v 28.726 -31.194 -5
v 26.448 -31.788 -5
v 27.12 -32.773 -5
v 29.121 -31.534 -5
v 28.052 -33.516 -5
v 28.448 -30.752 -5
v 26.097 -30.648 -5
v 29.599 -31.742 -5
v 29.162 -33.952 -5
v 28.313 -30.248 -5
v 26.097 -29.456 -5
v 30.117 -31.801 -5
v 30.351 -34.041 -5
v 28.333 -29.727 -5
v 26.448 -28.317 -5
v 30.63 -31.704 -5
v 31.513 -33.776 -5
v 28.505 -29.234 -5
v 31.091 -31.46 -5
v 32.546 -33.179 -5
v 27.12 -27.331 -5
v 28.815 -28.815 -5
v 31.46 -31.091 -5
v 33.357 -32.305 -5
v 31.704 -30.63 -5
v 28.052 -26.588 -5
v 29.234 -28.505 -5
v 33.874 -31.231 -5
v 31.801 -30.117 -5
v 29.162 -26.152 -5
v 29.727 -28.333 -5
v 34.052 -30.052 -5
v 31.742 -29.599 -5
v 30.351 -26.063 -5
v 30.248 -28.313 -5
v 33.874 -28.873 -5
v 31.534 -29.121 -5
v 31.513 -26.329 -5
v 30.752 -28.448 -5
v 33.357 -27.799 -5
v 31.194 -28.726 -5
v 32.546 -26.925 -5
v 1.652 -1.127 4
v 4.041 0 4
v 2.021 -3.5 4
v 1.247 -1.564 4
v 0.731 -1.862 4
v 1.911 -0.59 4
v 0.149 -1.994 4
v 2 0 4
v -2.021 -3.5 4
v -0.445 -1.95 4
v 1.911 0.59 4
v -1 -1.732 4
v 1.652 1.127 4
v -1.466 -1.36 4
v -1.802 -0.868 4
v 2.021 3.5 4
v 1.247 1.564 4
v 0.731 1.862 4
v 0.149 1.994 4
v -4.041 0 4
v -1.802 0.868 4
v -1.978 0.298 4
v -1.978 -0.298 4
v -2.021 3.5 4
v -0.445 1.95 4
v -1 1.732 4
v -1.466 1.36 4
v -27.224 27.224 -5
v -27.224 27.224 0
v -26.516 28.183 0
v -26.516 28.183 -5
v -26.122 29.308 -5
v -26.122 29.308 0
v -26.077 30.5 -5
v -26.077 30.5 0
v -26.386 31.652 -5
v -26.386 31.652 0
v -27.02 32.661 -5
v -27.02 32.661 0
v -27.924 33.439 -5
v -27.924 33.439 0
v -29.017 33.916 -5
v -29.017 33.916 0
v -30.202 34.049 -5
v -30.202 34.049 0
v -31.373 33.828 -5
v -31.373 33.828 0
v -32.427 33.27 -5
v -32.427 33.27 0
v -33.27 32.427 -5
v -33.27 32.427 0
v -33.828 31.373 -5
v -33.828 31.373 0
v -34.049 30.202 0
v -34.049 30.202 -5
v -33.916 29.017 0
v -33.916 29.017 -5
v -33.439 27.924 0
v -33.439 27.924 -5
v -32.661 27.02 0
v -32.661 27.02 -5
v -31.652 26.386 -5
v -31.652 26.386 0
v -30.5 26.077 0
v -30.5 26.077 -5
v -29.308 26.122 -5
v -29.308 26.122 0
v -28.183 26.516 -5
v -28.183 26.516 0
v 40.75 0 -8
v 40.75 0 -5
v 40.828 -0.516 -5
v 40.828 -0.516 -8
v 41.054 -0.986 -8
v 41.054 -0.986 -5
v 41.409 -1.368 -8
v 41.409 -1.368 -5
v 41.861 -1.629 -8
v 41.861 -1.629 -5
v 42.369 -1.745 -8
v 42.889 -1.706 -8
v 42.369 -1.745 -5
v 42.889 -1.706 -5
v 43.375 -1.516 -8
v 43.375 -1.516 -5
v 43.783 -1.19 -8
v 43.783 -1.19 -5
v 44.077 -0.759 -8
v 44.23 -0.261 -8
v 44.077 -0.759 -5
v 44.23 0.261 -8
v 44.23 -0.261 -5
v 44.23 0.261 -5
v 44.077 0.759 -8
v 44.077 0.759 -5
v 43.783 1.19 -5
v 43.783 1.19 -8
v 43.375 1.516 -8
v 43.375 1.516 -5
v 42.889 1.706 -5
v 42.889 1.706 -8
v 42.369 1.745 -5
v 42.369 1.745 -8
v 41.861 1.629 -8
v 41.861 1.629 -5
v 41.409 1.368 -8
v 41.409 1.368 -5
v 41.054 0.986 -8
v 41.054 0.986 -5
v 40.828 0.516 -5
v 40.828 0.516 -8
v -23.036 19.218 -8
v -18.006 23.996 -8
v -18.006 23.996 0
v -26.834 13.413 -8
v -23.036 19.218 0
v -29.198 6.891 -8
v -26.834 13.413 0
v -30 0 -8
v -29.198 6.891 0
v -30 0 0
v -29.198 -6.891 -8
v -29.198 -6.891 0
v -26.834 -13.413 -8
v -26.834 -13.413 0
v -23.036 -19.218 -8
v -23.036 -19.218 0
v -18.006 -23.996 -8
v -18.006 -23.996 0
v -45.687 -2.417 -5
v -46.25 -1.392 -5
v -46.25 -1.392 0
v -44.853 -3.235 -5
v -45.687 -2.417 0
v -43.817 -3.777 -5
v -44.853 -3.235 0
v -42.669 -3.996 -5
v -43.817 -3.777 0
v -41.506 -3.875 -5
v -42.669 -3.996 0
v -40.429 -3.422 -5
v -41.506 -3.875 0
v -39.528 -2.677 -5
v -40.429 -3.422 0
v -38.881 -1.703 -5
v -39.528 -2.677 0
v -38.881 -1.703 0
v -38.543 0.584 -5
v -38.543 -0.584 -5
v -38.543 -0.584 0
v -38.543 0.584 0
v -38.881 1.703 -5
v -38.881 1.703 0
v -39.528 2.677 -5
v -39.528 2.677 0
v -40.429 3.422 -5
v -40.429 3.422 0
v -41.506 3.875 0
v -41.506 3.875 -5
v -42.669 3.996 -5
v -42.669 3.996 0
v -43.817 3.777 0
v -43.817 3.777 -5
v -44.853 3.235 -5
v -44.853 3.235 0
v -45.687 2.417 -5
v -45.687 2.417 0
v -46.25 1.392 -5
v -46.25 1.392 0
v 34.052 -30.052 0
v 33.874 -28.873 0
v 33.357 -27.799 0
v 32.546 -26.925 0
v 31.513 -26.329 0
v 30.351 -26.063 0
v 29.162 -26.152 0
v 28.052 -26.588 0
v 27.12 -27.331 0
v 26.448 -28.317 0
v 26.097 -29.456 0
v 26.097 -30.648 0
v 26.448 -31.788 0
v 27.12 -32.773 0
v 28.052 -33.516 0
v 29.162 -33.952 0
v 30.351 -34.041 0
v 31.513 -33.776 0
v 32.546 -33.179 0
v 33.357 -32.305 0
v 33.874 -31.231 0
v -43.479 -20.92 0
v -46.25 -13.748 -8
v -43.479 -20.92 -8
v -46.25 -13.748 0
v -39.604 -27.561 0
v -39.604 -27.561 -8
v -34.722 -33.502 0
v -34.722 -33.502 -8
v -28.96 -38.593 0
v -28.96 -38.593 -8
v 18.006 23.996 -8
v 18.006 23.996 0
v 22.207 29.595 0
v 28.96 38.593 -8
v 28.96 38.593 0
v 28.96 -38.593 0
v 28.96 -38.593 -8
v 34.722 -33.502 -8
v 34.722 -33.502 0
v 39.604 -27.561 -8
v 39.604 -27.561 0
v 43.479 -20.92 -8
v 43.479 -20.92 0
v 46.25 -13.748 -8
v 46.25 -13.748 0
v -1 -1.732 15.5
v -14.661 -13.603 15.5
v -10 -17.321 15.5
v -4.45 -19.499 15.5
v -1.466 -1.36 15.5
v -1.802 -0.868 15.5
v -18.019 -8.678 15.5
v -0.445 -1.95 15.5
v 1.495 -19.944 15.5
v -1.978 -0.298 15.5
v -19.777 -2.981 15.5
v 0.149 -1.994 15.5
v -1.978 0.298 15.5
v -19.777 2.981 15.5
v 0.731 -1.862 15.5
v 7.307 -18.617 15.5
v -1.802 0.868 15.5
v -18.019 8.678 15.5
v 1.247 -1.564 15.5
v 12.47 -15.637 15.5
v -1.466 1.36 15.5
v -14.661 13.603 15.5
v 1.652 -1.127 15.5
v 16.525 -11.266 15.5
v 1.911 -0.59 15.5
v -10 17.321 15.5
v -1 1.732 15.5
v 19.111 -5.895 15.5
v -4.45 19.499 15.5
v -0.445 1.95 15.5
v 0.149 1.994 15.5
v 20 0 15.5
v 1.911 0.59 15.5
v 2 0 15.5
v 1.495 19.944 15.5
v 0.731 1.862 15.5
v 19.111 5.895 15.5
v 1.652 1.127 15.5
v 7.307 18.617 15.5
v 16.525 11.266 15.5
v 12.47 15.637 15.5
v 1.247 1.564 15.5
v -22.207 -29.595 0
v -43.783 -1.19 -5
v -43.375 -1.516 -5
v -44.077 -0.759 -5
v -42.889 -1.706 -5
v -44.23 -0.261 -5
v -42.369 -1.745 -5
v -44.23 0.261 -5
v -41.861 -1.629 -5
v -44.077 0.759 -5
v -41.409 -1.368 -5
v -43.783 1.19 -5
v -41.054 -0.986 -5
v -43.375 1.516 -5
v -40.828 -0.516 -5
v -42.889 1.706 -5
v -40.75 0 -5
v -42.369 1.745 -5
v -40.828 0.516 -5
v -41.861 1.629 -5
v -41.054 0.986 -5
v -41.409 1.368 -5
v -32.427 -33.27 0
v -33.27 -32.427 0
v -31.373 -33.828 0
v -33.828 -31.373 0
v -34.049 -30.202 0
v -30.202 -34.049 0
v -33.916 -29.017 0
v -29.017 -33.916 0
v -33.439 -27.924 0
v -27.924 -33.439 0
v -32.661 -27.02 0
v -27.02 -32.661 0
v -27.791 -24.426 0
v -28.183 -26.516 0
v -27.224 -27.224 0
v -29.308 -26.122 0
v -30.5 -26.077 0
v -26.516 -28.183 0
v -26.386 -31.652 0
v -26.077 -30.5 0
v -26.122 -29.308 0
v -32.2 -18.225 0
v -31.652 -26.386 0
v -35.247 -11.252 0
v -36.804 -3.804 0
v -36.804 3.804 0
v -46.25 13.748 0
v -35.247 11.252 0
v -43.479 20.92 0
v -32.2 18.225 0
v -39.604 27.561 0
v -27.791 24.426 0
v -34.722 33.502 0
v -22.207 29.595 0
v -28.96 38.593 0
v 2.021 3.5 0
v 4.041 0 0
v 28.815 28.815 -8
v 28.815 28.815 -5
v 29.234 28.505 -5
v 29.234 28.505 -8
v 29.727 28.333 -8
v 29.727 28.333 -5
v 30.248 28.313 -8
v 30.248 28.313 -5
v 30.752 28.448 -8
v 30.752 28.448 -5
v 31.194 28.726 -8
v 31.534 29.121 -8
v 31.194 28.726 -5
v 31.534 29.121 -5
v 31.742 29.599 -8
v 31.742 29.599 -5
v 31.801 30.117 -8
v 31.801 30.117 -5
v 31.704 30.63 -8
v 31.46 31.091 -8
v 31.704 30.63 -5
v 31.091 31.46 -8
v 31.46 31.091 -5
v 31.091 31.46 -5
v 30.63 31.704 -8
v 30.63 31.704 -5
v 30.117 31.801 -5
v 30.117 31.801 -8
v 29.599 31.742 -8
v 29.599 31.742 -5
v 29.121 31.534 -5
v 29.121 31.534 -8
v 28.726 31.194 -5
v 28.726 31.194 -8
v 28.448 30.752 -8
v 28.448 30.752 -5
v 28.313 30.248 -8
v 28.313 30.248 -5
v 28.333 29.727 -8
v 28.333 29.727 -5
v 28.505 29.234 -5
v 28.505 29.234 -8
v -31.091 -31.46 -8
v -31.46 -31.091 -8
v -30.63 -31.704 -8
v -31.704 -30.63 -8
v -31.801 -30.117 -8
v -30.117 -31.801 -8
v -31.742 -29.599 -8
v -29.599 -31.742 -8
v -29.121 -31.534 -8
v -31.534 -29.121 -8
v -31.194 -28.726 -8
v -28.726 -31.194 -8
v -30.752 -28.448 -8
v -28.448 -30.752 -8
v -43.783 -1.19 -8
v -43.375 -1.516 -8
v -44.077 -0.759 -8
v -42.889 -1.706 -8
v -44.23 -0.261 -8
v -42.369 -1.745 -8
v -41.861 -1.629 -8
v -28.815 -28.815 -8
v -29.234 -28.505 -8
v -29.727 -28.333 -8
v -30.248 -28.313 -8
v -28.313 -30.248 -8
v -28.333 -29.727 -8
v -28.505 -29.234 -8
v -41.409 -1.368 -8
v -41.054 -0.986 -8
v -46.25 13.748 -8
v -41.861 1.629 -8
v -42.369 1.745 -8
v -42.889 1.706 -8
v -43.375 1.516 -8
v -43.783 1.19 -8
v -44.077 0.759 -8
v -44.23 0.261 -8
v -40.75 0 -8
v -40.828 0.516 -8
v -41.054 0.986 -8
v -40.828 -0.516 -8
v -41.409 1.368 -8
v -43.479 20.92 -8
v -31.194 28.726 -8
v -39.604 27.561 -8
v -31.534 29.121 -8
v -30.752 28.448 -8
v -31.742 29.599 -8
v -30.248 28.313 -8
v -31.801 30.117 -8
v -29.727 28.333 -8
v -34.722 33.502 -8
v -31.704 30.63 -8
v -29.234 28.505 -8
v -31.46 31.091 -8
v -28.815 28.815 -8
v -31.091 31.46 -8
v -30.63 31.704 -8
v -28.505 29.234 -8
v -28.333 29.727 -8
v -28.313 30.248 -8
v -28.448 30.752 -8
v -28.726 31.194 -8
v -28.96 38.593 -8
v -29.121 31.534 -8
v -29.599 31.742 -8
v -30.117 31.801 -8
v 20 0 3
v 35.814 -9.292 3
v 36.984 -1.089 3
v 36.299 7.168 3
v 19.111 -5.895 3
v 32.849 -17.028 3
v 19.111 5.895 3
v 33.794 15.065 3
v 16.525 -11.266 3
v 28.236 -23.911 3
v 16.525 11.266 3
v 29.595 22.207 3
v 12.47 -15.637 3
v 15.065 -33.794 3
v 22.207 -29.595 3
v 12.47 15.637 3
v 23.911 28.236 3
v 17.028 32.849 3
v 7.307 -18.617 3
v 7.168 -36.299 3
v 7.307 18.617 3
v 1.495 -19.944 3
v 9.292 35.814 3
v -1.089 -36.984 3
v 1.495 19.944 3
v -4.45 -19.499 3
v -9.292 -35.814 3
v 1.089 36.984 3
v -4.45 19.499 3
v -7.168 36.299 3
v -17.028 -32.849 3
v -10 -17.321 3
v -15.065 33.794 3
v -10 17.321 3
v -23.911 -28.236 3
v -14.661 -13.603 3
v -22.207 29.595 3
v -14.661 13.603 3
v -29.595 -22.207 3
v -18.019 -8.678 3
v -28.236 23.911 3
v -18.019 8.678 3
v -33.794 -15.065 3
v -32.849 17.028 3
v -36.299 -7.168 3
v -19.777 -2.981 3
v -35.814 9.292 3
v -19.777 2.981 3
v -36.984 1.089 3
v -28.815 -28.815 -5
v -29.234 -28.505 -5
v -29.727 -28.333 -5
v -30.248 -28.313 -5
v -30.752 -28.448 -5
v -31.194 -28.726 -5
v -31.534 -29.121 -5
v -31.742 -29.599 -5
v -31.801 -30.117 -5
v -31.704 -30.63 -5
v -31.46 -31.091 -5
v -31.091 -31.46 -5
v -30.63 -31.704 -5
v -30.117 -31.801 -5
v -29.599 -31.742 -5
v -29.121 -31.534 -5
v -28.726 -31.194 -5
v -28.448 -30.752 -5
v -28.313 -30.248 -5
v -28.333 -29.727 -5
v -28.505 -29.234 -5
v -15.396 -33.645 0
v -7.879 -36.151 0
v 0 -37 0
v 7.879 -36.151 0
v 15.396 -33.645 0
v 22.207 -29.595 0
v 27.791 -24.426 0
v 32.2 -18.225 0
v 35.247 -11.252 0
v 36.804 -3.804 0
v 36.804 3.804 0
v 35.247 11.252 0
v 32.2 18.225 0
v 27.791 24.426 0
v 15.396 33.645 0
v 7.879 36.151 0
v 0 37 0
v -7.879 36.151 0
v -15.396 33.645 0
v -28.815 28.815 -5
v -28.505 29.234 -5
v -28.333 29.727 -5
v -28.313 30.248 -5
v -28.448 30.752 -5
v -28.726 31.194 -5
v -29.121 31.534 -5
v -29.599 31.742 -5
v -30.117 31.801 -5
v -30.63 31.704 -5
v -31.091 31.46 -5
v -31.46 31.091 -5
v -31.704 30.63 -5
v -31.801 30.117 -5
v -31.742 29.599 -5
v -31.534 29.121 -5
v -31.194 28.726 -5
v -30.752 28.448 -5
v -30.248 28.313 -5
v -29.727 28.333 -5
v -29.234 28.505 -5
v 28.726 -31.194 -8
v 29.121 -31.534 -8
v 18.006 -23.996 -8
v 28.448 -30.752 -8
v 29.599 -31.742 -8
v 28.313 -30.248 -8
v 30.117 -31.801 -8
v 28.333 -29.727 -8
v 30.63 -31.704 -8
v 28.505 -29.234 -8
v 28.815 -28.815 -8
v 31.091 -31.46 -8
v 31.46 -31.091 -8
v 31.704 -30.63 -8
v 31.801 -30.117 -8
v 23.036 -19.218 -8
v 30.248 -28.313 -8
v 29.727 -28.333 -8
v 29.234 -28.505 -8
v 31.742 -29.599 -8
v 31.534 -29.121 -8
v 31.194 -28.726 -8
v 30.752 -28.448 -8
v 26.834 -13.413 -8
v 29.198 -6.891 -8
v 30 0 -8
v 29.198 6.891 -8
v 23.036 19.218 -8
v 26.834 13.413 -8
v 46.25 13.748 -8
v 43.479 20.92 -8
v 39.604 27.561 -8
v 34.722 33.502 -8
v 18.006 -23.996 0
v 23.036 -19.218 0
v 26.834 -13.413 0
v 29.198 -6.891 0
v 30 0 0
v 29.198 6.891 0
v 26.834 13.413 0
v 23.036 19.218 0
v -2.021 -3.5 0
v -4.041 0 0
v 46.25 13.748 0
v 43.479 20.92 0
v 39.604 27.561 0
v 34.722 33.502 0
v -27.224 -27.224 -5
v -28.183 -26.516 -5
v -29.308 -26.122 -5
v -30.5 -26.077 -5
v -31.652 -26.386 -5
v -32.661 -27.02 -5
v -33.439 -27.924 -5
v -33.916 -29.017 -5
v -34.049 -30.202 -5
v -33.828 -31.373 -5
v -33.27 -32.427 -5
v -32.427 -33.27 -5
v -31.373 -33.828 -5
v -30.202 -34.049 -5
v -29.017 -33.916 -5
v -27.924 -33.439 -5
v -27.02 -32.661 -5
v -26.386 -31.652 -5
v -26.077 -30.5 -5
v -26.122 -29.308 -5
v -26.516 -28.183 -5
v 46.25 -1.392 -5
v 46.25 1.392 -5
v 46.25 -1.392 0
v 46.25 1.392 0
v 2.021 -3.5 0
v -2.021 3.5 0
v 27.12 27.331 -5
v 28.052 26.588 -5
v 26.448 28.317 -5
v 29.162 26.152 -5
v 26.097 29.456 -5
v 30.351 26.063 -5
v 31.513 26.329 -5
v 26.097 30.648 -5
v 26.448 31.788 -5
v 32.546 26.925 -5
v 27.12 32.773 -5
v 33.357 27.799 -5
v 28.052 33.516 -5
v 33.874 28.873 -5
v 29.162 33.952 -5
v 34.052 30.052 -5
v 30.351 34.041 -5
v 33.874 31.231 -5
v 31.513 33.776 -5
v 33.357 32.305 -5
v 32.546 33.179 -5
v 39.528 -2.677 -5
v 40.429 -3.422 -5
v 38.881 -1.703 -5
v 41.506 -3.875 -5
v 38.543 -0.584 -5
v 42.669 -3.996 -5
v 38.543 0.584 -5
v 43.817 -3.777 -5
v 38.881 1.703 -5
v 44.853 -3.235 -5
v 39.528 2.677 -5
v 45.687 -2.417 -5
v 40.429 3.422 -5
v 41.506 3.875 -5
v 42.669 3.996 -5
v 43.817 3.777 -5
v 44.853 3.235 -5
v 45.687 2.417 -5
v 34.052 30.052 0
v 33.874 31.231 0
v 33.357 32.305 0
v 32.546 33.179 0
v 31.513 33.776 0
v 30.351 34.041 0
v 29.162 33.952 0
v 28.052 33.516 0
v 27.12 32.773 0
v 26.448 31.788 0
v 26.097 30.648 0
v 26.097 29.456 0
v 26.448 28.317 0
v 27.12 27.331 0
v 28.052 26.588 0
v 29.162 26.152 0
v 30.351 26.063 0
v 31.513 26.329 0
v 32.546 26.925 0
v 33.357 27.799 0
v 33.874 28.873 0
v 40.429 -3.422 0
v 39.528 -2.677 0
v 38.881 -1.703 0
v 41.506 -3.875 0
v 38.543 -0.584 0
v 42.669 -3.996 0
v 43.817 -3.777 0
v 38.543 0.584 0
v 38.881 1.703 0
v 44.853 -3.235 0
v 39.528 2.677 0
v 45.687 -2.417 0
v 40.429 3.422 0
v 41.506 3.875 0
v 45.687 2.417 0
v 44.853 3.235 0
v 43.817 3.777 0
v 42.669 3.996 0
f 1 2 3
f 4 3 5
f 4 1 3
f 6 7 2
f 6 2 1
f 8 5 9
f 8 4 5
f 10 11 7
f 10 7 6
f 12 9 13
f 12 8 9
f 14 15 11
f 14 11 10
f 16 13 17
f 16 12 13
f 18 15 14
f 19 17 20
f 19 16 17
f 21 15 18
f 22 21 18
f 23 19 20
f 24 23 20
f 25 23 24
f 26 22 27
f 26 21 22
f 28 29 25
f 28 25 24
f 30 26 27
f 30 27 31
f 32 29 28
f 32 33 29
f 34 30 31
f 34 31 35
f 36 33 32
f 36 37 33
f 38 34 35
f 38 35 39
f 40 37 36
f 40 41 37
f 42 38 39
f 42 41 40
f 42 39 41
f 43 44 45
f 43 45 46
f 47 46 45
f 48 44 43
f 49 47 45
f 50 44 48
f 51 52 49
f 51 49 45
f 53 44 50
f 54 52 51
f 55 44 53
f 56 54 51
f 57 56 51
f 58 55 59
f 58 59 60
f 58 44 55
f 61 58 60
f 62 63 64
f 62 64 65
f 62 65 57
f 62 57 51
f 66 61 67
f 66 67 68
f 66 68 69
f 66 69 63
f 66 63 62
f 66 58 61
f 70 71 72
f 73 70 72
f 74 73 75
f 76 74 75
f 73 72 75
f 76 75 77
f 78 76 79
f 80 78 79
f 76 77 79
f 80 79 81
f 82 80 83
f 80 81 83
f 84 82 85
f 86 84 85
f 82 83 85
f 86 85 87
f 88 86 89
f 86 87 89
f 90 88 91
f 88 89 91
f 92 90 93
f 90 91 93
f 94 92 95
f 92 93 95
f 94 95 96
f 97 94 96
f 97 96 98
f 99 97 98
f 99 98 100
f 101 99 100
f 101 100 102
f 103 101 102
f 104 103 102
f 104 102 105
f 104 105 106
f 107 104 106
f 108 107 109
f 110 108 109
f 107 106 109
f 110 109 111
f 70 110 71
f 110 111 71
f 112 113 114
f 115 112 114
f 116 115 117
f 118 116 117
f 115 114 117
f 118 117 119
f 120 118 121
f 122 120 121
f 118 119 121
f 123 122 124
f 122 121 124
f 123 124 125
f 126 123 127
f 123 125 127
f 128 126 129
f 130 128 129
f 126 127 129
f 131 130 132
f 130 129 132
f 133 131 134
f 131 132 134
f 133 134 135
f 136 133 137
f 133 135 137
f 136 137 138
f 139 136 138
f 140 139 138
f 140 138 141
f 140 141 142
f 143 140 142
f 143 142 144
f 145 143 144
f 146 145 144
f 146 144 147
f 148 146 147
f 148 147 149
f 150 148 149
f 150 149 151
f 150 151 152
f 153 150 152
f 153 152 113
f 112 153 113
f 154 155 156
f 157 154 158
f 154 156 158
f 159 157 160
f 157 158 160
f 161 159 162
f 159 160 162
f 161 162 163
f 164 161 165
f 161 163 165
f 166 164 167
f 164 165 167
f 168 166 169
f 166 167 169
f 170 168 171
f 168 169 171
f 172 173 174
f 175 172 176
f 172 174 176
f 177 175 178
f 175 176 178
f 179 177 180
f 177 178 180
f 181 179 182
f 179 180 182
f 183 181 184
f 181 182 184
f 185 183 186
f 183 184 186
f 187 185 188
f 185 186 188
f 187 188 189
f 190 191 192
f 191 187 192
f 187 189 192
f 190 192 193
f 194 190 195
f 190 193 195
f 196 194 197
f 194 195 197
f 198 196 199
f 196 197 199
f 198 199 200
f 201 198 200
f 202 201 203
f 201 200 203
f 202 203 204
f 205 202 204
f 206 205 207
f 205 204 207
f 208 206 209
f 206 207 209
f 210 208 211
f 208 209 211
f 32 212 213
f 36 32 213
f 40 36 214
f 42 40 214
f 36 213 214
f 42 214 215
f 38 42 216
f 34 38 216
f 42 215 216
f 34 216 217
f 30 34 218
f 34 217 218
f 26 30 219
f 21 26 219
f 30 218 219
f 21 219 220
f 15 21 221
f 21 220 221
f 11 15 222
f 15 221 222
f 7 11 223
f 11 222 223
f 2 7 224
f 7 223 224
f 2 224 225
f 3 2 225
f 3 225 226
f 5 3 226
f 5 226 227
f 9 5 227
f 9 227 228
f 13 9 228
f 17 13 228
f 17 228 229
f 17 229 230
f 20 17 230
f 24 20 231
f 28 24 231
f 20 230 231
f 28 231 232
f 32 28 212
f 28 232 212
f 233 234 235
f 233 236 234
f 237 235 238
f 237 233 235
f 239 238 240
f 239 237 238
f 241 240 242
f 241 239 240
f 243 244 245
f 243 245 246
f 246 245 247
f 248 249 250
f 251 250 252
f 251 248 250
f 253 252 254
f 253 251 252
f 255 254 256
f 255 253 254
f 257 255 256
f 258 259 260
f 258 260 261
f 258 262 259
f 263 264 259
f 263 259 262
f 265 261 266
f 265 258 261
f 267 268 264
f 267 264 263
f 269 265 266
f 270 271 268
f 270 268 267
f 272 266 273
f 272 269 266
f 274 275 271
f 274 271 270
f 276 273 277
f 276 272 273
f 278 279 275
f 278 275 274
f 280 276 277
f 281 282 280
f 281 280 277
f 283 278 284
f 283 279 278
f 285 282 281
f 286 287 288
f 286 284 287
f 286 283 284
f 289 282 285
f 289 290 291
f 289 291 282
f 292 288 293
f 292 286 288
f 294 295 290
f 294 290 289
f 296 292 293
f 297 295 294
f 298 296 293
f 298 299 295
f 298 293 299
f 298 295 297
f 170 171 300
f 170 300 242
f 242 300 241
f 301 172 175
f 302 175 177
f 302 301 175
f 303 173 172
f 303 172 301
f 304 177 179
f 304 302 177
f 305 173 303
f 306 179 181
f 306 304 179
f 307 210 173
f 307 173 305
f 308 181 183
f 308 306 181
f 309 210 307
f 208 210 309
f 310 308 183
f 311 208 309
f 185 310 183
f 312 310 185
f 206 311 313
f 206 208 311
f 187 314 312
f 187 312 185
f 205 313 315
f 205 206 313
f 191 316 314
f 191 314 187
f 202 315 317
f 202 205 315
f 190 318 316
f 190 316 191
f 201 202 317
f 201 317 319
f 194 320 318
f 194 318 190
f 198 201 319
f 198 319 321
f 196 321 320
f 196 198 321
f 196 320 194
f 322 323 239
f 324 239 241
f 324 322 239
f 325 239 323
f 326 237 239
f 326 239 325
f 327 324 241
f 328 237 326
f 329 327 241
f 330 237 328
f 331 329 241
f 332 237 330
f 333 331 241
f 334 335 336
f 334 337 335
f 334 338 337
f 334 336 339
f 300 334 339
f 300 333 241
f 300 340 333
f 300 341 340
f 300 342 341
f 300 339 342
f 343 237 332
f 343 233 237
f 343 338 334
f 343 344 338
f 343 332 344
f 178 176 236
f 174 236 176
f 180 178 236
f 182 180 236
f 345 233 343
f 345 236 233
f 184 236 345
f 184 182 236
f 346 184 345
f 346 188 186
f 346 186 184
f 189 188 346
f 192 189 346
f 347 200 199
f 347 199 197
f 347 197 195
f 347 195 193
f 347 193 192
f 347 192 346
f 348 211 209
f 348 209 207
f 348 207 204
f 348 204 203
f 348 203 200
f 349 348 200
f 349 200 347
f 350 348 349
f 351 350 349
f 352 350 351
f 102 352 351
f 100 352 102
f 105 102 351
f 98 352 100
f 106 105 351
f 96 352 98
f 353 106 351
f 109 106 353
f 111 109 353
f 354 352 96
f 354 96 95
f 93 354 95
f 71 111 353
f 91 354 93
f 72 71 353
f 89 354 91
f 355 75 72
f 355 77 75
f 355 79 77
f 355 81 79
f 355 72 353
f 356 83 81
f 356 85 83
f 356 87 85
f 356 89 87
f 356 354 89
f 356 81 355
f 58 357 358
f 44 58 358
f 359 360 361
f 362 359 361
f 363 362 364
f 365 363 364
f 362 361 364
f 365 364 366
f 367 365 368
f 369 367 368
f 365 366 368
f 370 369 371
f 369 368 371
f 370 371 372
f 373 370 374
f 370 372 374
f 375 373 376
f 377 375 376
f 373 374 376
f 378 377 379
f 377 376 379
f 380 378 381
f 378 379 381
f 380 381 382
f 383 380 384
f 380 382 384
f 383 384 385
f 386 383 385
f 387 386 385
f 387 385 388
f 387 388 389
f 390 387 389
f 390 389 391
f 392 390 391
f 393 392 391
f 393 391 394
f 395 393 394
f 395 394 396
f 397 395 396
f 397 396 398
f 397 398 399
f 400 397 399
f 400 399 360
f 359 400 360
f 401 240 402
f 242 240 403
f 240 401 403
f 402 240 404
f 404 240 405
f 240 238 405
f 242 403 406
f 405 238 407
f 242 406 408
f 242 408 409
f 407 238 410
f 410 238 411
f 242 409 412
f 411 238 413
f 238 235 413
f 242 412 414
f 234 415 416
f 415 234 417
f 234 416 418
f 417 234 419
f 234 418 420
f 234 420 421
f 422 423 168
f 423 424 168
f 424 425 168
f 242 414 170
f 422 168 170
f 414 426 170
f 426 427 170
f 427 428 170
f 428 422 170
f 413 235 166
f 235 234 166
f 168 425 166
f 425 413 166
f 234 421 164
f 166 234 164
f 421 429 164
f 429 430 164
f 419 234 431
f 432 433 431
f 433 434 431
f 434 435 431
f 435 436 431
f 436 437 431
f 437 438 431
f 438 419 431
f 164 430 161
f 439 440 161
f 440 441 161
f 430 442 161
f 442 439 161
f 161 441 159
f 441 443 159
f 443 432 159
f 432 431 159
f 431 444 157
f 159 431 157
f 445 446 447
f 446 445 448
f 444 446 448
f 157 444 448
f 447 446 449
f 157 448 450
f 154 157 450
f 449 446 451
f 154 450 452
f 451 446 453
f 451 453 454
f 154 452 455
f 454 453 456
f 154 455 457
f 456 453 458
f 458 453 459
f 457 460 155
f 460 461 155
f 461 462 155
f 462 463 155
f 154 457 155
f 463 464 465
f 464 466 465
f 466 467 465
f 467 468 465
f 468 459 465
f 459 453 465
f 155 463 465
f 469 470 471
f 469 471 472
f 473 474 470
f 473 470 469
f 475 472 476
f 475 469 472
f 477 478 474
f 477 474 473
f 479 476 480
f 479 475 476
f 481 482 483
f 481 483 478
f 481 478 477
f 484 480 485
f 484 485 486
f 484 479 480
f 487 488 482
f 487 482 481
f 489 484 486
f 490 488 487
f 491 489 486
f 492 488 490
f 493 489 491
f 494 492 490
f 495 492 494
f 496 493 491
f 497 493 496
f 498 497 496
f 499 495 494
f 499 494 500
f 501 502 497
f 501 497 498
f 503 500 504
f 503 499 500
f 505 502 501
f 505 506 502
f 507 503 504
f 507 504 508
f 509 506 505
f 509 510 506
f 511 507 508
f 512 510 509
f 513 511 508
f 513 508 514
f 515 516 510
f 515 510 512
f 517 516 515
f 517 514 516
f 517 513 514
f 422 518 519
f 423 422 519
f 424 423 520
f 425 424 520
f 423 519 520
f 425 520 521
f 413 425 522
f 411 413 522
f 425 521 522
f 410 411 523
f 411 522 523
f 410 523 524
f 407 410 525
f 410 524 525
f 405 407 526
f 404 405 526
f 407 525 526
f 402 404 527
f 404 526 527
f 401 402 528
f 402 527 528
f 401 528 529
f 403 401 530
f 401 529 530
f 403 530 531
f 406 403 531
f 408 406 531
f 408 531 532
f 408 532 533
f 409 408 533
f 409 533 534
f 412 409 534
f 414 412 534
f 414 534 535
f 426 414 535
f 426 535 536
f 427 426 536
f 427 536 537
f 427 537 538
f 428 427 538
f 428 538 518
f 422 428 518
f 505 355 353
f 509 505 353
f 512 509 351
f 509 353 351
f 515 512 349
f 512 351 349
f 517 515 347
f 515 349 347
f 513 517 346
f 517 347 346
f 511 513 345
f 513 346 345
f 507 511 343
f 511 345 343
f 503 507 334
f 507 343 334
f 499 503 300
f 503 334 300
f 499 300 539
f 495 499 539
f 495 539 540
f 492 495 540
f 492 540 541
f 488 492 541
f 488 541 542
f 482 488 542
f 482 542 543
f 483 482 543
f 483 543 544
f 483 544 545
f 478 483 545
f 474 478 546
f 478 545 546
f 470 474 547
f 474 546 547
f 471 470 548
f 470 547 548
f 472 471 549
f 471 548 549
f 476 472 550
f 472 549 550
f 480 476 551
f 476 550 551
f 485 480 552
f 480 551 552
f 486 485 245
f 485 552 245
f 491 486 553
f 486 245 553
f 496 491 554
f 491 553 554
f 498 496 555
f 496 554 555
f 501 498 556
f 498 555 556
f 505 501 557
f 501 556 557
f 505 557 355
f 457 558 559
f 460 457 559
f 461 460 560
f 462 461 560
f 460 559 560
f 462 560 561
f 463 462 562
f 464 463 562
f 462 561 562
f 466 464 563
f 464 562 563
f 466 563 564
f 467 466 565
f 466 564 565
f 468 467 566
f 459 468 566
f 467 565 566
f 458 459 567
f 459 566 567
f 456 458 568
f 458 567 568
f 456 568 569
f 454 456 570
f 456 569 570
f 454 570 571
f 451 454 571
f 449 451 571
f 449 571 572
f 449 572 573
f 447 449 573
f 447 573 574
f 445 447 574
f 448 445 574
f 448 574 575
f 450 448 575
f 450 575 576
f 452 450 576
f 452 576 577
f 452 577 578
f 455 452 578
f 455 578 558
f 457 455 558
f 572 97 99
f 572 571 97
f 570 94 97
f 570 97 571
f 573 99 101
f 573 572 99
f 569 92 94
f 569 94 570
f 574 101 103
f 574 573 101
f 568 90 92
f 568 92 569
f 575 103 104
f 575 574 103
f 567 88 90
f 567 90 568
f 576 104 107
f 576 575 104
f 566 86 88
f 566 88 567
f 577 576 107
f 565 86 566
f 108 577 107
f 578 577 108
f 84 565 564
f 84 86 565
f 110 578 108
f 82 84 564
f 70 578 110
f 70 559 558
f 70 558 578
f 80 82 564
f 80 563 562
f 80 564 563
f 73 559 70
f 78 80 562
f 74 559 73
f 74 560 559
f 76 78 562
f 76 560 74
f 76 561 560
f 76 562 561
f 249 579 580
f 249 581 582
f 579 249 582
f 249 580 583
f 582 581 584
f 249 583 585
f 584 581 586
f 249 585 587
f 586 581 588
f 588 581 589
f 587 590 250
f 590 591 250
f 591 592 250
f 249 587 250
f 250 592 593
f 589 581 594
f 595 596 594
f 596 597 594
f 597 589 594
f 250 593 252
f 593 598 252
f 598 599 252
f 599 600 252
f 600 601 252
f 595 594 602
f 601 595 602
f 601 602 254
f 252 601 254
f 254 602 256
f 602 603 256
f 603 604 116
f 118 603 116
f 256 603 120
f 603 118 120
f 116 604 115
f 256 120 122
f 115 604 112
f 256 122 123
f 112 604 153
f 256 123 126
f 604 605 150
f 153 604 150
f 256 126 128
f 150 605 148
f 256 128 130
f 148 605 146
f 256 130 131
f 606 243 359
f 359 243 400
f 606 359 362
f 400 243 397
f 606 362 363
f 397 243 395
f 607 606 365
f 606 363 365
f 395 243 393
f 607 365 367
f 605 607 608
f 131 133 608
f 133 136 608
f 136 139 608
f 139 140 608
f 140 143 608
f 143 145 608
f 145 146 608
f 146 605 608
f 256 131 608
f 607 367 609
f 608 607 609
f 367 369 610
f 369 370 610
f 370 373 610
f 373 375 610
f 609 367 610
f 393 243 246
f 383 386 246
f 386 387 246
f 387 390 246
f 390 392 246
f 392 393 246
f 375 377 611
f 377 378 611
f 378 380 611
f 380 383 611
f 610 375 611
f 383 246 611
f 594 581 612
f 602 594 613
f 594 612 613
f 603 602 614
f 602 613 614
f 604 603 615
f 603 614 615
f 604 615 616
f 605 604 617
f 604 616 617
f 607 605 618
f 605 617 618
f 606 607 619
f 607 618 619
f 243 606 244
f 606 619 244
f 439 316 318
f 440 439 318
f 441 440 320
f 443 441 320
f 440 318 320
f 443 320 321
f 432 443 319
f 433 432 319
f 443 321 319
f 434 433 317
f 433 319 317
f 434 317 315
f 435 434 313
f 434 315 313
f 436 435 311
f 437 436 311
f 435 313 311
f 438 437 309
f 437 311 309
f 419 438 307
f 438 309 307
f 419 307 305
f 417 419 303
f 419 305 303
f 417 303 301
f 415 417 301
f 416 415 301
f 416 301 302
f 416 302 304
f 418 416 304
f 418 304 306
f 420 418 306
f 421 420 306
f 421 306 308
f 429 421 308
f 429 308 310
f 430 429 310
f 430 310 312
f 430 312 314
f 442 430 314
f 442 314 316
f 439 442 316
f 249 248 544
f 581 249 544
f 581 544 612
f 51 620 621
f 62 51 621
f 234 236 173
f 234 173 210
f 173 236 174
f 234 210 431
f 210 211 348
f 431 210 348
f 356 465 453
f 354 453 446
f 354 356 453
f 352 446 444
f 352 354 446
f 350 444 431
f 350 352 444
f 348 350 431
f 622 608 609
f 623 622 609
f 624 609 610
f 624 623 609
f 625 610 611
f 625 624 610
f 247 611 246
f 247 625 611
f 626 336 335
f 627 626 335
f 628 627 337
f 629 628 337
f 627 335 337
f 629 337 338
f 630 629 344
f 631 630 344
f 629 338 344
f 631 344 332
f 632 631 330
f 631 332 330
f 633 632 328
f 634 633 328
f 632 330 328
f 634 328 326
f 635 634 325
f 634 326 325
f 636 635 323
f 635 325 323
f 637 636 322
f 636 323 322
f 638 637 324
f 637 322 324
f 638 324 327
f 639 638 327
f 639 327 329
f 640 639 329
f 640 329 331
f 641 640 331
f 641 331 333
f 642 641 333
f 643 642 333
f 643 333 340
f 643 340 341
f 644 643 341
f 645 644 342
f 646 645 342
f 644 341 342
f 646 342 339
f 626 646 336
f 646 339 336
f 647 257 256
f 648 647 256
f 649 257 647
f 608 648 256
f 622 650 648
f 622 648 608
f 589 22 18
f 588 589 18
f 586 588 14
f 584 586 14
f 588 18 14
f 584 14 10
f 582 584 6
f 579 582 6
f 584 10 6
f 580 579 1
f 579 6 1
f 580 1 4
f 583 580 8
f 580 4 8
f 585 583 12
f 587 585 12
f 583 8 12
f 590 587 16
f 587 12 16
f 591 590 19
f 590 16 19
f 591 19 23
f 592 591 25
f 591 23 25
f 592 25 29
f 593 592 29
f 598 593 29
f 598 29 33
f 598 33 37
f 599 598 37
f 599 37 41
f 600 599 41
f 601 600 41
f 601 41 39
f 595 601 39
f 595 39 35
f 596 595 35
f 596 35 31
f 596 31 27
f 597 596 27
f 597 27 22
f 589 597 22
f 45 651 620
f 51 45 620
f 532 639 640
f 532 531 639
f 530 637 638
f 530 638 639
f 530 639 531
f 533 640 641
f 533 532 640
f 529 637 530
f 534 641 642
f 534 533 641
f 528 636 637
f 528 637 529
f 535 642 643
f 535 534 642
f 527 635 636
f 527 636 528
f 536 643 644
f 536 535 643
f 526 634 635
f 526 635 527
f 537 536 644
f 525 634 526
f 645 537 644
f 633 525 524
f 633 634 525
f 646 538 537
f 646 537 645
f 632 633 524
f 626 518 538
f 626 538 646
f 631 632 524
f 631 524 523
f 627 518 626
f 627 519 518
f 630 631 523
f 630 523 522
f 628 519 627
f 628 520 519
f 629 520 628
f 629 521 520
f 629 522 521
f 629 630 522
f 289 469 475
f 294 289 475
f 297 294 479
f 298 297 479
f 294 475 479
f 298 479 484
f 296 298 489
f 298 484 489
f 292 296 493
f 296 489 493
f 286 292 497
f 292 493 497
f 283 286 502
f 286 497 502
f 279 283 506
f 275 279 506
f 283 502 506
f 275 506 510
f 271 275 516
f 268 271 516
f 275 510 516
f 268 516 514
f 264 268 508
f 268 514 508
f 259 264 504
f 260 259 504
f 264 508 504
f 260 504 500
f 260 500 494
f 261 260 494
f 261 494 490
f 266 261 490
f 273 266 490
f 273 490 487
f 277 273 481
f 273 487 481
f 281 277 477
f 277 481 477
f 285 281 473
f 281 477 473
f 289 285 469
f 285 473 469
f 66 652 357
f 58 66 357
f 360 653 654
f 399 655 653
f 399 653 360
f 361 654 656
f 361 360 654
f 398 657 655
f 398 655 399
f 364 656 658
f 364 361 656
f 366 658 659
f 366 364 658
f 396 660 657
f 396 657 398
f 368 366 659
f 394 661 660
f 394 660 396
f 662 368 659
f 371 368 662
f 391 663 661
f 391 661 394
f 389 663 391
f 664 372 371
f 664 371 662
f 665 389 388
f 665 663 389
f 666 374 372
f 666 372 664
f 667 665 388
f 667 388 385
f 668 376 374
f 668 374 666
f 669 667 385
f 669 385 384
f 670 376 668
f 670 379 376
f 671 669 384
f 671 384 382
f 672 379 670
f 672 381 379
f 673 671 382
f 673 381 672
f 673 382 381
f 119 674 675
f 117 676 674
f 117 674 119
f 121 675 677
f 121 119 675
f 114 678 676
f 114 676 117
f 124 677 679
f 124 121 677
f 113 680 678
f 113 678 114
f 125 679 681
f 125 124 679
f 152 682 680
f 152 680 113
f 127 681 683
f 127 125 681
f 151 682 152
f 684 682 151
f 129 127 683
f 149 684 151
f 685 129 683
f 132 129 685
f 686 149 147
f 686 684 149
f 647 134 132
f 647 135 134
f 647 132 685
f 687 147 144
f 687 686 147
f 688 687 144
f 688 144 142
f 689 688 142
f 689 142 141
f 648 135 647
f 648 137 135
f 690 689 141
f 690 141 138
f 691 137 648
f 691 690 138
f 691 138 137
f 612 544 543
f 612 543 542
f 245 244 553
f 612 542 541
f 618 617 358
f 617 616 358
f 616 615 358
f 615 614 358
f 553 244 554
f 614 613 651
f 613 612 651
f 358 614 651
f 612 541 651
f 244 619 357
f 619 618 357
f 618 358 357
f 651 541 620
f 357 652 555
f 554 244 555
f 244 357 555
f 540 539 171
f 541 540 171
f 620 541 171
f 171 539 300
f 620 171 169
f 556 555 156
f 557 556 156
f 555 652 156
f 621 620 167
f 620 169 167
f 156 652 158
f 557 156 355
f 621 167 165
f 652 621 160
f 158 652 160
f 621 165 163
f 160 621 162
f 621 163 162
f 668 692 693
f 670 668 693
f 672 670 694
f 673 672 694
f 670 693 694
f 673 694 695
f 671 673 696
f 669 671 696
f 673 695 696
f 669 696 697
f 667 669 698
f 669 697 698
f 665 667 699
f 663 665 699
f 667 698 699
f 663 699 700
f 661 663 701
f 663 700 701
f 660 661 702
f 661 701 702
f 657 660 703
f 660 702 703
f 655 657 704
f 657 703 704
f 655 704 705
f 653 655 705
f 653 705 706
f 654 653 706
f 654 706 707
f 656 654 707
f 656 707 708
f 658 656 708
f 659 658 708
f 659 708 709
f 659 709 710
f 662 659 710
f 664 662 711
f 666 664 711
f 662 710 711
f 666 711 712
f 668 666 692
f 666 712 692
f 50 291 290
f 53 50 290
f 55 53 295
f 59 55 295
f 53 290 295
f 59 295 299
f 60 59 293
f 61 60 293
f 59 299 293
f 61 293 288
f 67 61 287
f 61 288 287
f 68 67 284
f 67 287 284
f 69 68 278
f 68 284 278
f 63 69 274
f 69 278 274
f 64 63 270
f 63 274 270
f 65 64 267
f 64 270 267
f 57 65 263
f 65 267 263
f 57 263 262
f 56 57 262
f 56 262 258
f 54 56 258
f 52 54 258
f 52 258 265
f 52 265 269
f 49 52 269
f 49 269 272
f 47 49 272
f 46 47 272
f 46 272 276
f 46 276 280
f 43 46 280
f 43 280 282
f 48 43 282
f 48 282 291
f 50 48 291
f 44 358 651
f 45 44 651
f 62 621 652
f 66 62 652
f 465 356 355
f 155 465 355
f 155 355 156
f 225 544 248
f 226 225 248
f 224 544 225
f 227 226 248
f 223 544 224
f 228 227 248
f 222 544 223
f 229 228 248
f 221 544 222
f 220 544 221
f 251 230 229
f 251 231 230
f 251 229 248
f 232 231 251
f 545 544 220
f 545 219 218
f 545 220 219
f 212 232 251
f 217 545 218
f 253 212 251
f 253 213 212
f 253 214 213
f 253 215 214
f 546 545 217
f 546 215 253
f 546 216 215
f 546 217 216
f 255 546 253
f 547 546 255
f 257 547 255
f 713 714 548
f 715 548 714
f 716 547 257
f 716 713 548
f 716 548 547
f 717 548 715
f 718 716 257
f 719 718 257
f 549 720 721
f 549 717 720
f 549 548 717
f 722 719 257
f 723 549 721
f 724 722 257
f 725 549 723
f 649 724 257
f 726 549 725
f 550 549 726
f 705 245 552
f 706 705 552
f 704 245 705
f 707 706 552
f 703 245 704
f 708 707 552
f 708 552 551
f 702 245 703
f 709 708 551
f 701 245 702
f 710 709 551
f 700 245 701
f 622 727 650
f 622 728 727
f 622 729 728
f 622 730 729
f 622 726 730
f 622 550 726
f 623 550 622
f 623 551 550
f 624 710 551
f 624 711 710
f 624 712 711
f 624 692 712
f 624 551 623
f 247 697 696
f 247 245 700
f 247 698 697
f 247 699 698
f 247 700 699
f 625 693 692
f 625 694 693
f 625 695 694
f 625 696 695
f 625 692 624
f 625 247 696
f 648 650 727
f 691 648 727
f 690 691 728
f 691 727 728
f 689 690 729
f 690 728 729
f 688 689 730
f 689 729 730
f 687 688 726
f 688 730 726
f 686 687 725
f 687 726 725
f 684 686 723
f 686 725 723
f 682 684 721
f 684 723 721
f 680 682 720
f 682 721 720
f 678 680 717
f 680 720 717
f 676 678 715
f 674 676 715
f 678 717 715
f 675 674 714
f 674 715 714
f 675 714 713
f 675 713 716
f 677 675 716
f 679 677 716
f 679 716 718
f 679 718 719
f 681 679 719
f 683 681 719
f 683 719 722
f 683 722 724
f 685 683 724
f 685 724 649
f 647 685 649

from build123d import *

# Parameters (mm, degrees)
SKETCH1_R           = 48.25
BOSS_EXTRUDE1_DEPTH = 8
SKETCH2_W           = 17.162038191
SKETCH2_H           = 56.822210482
SKETCH2_W_2         = 16.152506533
SKETCH2_H_2         = 65.186901365
CUT_EXTRUDE1_DEPTH  = 8
SKETCH3_R           = 30
CUT_EXTRUDE2_DEPTH  = 8
SKETCH4_R           = 1.75
CUT_EXTRUDE3_DEPTH  = 10
CIRPATTERN1_COUNT   = 8
CUT_EXTRUDE4_DEPTH  = 10
CIRPATTERN2_COUNT   = 2
SKETCH9_R           = 4
CUT_EXTRUDE5_DEPTH  = 5
CIRPATTERN3_COUNT   = 8
SKETCH10_R          = 4
CUT_EXTRUDE6_DEPTH  = 5
SKETCH11_R          = 37
BOSS_EXTRUDE2_DEPTH = 3
SKETCH12_R          = 20
BOSS_EXTRUDE3_DEPTH = 12.5
SKETCH13_R          = 2
CUT_EXTRUDE8_DEPTH  = 38
CUT_EXTRUDE9_DEPTH  = 4


with BuildPart() as part:
    # Sketch1 → Boss-Extrude1 (new body)
    with BuildSketch(Plane.XY):
        Circle(SKETCH1_R)
    extrude(amount=-BOSS_EXTRUDE1_DEPTH)

    # Sketch2 → Cut-Extrude1 (cut)
    with BuildSketch(Plane.XY):
        with Locations((-54.831019095, 0)):
            Rectangle(SKETCH2_W, SKETCH2_H)
        with Locations((54.326253267, -4.182345442)):
            Rectangle(SKETCH2_W_2, SKETCH2_H_2)
    extrude(amount=-CUT_EXTRUDE1_DEPTH, mode=Mode.SUBTRACT)

    # Sketch3 → Cut-Extrude2 (cut)
    with BuildSketch(Plane.XY):
        Circle(SKETCH3_R)
    extrude(amount=-CUT_EXTRUDE2_DEPTH, mode=Mode.SUBTRACT)

    # Sketch4 → Cut-Extrude3 (cut)
    with BuildSketch(Plane.XY):
        with Locations((-42.5, 0)):
            Circle(SKETCH4_R)
    cut_extrude3 = extrude(amount=-CUT_EXTRUDE3_DEPTH, mode=Mode.SUBTRACT)

    # CirPattern1: Cut-Extrude3 ×8 about axis
    cirpattern1_axis = Axis((0, 0, 0), (0, 0, 1))
    for i in range(1, CIRPATTERN1_COUNT):
        add(cut_extrude3.rotate(cirpattern1_axis, i * 360 / CIRPATTERN1_COUNT), mode=Mode.SUBTRACT)

    # Sketch8 → Cut-Extrude4 (cut)
    with BuildSketch(Plane.XY):
        with BuildLine():
            Line((-28.959547499, 38.59283753), (0, 0))
            Line((0, 0), (28.959547499, 38.59283753))
            ThreePointArc((28.959547499, 38.59283753), (0, 48.25), (-28.959547499, 38.59283753))
        make_face()
    cut_extrude4 = extrude(amount=-CUT_EXTRUDE4_DEPTH, mode=Mode.SUBTRACT)

    # CirPattern2: Cut-Extrude4 ×2 about axis
    cirpattern2_axis = Axis((0, 0, 0), (0, 0, 1))
    for i in range(1, CIRPATTERN2_COUNT):
        add(cut_extrude4.rotate(cirpattern2_axis, i * 360 / CIRPATTERN2_COUNT), mode=Mode.SUBTRACT)

    # Sketch9 → Cut-Extrude5 (cut)
    with BuildSketch(Plane.XY):
        with Locations((-42.5, 0)):
            Circle(SKETCH9_R)
    cut_extrude5 = extrude(amount=-CUT_EXTRUDE5_DEPTH, mode=Mode.SUBTRACT)

    # CirPattern3: Cut-Extrude5 ×8 about axis, 3 skipped
    cirpattern3_axis = Axis((0, 0, 0), (0, 0, 1))
    add([cut_extrude5.rotate(cirpattern3_axis, i * 360 / CIRPATTERN3_COUNT) for i in range(1, CIRPATTERN3_COUNT) if i not in (3, 4, 5)], mode=Mode.SUBTRACT)

    # Sketch10 → Cut-Extrude6 (cut)
    with BuildSketch(Plane.XY):
        with Locations((42.5, 0)):
            Circle(SKETCH10_R)
        with Locations((30.0520382, 30.0520382)):
            Circle(SKETCH10_R)
        with Locations((30.0520382, -30.0520382)):
            Circle(SKETCH10_R)
    extrude(amount=-CUT_EXTRUDE6_DEPTH, mode=Mode.SUBTRACT)

    # Sketch11 → Boss-Extrude2 (add)
    with BuildSketch(Plane.XY):
        with Locations(Location((0, 0, 0), (0, 0, 126.884070759))):
            Circle(SKETCH11_R)
    extrude(amount=BOSS_EXTRUDE2_DEPTH)

    # Sketch12 → Boss-Extrude3 (add)
    with BuildSketch(Plane.XY.offset(3)):
        Circle(SKETCH12_R)
    extrude(amount=BOSS_EXTRUDE3_DEPTH)

    # Sketch13 → Cut-Extrude8 (cut)
    with BuildSketch(Plane.XY.offset(15.5)):
        Circle(SKETCH13_R)
    extrude(amount=-CUT_EXTRUDE8_DEPTH, mode=Mode.SUBTRACT)

    # Sketch14 → Cut-Extrude9 (cut)
    with BuildSketch(Plane(origin=(0, 0, 0), x_dir=(-1, 0, 0), z_dir=(0, 0, -1))):
        Polygon((-2.020725942, -3.5), (2.020725942, -3.5), (4.041451884, 0), (2.020725942, 3.5), (-2.020725942, 3.5), (-4.041451884, 0), align=None)
    extrude(amount=-CUT_EXTRUDE9_DEPTH, mode=Mode.SUBTRACT)


solid = part.part
